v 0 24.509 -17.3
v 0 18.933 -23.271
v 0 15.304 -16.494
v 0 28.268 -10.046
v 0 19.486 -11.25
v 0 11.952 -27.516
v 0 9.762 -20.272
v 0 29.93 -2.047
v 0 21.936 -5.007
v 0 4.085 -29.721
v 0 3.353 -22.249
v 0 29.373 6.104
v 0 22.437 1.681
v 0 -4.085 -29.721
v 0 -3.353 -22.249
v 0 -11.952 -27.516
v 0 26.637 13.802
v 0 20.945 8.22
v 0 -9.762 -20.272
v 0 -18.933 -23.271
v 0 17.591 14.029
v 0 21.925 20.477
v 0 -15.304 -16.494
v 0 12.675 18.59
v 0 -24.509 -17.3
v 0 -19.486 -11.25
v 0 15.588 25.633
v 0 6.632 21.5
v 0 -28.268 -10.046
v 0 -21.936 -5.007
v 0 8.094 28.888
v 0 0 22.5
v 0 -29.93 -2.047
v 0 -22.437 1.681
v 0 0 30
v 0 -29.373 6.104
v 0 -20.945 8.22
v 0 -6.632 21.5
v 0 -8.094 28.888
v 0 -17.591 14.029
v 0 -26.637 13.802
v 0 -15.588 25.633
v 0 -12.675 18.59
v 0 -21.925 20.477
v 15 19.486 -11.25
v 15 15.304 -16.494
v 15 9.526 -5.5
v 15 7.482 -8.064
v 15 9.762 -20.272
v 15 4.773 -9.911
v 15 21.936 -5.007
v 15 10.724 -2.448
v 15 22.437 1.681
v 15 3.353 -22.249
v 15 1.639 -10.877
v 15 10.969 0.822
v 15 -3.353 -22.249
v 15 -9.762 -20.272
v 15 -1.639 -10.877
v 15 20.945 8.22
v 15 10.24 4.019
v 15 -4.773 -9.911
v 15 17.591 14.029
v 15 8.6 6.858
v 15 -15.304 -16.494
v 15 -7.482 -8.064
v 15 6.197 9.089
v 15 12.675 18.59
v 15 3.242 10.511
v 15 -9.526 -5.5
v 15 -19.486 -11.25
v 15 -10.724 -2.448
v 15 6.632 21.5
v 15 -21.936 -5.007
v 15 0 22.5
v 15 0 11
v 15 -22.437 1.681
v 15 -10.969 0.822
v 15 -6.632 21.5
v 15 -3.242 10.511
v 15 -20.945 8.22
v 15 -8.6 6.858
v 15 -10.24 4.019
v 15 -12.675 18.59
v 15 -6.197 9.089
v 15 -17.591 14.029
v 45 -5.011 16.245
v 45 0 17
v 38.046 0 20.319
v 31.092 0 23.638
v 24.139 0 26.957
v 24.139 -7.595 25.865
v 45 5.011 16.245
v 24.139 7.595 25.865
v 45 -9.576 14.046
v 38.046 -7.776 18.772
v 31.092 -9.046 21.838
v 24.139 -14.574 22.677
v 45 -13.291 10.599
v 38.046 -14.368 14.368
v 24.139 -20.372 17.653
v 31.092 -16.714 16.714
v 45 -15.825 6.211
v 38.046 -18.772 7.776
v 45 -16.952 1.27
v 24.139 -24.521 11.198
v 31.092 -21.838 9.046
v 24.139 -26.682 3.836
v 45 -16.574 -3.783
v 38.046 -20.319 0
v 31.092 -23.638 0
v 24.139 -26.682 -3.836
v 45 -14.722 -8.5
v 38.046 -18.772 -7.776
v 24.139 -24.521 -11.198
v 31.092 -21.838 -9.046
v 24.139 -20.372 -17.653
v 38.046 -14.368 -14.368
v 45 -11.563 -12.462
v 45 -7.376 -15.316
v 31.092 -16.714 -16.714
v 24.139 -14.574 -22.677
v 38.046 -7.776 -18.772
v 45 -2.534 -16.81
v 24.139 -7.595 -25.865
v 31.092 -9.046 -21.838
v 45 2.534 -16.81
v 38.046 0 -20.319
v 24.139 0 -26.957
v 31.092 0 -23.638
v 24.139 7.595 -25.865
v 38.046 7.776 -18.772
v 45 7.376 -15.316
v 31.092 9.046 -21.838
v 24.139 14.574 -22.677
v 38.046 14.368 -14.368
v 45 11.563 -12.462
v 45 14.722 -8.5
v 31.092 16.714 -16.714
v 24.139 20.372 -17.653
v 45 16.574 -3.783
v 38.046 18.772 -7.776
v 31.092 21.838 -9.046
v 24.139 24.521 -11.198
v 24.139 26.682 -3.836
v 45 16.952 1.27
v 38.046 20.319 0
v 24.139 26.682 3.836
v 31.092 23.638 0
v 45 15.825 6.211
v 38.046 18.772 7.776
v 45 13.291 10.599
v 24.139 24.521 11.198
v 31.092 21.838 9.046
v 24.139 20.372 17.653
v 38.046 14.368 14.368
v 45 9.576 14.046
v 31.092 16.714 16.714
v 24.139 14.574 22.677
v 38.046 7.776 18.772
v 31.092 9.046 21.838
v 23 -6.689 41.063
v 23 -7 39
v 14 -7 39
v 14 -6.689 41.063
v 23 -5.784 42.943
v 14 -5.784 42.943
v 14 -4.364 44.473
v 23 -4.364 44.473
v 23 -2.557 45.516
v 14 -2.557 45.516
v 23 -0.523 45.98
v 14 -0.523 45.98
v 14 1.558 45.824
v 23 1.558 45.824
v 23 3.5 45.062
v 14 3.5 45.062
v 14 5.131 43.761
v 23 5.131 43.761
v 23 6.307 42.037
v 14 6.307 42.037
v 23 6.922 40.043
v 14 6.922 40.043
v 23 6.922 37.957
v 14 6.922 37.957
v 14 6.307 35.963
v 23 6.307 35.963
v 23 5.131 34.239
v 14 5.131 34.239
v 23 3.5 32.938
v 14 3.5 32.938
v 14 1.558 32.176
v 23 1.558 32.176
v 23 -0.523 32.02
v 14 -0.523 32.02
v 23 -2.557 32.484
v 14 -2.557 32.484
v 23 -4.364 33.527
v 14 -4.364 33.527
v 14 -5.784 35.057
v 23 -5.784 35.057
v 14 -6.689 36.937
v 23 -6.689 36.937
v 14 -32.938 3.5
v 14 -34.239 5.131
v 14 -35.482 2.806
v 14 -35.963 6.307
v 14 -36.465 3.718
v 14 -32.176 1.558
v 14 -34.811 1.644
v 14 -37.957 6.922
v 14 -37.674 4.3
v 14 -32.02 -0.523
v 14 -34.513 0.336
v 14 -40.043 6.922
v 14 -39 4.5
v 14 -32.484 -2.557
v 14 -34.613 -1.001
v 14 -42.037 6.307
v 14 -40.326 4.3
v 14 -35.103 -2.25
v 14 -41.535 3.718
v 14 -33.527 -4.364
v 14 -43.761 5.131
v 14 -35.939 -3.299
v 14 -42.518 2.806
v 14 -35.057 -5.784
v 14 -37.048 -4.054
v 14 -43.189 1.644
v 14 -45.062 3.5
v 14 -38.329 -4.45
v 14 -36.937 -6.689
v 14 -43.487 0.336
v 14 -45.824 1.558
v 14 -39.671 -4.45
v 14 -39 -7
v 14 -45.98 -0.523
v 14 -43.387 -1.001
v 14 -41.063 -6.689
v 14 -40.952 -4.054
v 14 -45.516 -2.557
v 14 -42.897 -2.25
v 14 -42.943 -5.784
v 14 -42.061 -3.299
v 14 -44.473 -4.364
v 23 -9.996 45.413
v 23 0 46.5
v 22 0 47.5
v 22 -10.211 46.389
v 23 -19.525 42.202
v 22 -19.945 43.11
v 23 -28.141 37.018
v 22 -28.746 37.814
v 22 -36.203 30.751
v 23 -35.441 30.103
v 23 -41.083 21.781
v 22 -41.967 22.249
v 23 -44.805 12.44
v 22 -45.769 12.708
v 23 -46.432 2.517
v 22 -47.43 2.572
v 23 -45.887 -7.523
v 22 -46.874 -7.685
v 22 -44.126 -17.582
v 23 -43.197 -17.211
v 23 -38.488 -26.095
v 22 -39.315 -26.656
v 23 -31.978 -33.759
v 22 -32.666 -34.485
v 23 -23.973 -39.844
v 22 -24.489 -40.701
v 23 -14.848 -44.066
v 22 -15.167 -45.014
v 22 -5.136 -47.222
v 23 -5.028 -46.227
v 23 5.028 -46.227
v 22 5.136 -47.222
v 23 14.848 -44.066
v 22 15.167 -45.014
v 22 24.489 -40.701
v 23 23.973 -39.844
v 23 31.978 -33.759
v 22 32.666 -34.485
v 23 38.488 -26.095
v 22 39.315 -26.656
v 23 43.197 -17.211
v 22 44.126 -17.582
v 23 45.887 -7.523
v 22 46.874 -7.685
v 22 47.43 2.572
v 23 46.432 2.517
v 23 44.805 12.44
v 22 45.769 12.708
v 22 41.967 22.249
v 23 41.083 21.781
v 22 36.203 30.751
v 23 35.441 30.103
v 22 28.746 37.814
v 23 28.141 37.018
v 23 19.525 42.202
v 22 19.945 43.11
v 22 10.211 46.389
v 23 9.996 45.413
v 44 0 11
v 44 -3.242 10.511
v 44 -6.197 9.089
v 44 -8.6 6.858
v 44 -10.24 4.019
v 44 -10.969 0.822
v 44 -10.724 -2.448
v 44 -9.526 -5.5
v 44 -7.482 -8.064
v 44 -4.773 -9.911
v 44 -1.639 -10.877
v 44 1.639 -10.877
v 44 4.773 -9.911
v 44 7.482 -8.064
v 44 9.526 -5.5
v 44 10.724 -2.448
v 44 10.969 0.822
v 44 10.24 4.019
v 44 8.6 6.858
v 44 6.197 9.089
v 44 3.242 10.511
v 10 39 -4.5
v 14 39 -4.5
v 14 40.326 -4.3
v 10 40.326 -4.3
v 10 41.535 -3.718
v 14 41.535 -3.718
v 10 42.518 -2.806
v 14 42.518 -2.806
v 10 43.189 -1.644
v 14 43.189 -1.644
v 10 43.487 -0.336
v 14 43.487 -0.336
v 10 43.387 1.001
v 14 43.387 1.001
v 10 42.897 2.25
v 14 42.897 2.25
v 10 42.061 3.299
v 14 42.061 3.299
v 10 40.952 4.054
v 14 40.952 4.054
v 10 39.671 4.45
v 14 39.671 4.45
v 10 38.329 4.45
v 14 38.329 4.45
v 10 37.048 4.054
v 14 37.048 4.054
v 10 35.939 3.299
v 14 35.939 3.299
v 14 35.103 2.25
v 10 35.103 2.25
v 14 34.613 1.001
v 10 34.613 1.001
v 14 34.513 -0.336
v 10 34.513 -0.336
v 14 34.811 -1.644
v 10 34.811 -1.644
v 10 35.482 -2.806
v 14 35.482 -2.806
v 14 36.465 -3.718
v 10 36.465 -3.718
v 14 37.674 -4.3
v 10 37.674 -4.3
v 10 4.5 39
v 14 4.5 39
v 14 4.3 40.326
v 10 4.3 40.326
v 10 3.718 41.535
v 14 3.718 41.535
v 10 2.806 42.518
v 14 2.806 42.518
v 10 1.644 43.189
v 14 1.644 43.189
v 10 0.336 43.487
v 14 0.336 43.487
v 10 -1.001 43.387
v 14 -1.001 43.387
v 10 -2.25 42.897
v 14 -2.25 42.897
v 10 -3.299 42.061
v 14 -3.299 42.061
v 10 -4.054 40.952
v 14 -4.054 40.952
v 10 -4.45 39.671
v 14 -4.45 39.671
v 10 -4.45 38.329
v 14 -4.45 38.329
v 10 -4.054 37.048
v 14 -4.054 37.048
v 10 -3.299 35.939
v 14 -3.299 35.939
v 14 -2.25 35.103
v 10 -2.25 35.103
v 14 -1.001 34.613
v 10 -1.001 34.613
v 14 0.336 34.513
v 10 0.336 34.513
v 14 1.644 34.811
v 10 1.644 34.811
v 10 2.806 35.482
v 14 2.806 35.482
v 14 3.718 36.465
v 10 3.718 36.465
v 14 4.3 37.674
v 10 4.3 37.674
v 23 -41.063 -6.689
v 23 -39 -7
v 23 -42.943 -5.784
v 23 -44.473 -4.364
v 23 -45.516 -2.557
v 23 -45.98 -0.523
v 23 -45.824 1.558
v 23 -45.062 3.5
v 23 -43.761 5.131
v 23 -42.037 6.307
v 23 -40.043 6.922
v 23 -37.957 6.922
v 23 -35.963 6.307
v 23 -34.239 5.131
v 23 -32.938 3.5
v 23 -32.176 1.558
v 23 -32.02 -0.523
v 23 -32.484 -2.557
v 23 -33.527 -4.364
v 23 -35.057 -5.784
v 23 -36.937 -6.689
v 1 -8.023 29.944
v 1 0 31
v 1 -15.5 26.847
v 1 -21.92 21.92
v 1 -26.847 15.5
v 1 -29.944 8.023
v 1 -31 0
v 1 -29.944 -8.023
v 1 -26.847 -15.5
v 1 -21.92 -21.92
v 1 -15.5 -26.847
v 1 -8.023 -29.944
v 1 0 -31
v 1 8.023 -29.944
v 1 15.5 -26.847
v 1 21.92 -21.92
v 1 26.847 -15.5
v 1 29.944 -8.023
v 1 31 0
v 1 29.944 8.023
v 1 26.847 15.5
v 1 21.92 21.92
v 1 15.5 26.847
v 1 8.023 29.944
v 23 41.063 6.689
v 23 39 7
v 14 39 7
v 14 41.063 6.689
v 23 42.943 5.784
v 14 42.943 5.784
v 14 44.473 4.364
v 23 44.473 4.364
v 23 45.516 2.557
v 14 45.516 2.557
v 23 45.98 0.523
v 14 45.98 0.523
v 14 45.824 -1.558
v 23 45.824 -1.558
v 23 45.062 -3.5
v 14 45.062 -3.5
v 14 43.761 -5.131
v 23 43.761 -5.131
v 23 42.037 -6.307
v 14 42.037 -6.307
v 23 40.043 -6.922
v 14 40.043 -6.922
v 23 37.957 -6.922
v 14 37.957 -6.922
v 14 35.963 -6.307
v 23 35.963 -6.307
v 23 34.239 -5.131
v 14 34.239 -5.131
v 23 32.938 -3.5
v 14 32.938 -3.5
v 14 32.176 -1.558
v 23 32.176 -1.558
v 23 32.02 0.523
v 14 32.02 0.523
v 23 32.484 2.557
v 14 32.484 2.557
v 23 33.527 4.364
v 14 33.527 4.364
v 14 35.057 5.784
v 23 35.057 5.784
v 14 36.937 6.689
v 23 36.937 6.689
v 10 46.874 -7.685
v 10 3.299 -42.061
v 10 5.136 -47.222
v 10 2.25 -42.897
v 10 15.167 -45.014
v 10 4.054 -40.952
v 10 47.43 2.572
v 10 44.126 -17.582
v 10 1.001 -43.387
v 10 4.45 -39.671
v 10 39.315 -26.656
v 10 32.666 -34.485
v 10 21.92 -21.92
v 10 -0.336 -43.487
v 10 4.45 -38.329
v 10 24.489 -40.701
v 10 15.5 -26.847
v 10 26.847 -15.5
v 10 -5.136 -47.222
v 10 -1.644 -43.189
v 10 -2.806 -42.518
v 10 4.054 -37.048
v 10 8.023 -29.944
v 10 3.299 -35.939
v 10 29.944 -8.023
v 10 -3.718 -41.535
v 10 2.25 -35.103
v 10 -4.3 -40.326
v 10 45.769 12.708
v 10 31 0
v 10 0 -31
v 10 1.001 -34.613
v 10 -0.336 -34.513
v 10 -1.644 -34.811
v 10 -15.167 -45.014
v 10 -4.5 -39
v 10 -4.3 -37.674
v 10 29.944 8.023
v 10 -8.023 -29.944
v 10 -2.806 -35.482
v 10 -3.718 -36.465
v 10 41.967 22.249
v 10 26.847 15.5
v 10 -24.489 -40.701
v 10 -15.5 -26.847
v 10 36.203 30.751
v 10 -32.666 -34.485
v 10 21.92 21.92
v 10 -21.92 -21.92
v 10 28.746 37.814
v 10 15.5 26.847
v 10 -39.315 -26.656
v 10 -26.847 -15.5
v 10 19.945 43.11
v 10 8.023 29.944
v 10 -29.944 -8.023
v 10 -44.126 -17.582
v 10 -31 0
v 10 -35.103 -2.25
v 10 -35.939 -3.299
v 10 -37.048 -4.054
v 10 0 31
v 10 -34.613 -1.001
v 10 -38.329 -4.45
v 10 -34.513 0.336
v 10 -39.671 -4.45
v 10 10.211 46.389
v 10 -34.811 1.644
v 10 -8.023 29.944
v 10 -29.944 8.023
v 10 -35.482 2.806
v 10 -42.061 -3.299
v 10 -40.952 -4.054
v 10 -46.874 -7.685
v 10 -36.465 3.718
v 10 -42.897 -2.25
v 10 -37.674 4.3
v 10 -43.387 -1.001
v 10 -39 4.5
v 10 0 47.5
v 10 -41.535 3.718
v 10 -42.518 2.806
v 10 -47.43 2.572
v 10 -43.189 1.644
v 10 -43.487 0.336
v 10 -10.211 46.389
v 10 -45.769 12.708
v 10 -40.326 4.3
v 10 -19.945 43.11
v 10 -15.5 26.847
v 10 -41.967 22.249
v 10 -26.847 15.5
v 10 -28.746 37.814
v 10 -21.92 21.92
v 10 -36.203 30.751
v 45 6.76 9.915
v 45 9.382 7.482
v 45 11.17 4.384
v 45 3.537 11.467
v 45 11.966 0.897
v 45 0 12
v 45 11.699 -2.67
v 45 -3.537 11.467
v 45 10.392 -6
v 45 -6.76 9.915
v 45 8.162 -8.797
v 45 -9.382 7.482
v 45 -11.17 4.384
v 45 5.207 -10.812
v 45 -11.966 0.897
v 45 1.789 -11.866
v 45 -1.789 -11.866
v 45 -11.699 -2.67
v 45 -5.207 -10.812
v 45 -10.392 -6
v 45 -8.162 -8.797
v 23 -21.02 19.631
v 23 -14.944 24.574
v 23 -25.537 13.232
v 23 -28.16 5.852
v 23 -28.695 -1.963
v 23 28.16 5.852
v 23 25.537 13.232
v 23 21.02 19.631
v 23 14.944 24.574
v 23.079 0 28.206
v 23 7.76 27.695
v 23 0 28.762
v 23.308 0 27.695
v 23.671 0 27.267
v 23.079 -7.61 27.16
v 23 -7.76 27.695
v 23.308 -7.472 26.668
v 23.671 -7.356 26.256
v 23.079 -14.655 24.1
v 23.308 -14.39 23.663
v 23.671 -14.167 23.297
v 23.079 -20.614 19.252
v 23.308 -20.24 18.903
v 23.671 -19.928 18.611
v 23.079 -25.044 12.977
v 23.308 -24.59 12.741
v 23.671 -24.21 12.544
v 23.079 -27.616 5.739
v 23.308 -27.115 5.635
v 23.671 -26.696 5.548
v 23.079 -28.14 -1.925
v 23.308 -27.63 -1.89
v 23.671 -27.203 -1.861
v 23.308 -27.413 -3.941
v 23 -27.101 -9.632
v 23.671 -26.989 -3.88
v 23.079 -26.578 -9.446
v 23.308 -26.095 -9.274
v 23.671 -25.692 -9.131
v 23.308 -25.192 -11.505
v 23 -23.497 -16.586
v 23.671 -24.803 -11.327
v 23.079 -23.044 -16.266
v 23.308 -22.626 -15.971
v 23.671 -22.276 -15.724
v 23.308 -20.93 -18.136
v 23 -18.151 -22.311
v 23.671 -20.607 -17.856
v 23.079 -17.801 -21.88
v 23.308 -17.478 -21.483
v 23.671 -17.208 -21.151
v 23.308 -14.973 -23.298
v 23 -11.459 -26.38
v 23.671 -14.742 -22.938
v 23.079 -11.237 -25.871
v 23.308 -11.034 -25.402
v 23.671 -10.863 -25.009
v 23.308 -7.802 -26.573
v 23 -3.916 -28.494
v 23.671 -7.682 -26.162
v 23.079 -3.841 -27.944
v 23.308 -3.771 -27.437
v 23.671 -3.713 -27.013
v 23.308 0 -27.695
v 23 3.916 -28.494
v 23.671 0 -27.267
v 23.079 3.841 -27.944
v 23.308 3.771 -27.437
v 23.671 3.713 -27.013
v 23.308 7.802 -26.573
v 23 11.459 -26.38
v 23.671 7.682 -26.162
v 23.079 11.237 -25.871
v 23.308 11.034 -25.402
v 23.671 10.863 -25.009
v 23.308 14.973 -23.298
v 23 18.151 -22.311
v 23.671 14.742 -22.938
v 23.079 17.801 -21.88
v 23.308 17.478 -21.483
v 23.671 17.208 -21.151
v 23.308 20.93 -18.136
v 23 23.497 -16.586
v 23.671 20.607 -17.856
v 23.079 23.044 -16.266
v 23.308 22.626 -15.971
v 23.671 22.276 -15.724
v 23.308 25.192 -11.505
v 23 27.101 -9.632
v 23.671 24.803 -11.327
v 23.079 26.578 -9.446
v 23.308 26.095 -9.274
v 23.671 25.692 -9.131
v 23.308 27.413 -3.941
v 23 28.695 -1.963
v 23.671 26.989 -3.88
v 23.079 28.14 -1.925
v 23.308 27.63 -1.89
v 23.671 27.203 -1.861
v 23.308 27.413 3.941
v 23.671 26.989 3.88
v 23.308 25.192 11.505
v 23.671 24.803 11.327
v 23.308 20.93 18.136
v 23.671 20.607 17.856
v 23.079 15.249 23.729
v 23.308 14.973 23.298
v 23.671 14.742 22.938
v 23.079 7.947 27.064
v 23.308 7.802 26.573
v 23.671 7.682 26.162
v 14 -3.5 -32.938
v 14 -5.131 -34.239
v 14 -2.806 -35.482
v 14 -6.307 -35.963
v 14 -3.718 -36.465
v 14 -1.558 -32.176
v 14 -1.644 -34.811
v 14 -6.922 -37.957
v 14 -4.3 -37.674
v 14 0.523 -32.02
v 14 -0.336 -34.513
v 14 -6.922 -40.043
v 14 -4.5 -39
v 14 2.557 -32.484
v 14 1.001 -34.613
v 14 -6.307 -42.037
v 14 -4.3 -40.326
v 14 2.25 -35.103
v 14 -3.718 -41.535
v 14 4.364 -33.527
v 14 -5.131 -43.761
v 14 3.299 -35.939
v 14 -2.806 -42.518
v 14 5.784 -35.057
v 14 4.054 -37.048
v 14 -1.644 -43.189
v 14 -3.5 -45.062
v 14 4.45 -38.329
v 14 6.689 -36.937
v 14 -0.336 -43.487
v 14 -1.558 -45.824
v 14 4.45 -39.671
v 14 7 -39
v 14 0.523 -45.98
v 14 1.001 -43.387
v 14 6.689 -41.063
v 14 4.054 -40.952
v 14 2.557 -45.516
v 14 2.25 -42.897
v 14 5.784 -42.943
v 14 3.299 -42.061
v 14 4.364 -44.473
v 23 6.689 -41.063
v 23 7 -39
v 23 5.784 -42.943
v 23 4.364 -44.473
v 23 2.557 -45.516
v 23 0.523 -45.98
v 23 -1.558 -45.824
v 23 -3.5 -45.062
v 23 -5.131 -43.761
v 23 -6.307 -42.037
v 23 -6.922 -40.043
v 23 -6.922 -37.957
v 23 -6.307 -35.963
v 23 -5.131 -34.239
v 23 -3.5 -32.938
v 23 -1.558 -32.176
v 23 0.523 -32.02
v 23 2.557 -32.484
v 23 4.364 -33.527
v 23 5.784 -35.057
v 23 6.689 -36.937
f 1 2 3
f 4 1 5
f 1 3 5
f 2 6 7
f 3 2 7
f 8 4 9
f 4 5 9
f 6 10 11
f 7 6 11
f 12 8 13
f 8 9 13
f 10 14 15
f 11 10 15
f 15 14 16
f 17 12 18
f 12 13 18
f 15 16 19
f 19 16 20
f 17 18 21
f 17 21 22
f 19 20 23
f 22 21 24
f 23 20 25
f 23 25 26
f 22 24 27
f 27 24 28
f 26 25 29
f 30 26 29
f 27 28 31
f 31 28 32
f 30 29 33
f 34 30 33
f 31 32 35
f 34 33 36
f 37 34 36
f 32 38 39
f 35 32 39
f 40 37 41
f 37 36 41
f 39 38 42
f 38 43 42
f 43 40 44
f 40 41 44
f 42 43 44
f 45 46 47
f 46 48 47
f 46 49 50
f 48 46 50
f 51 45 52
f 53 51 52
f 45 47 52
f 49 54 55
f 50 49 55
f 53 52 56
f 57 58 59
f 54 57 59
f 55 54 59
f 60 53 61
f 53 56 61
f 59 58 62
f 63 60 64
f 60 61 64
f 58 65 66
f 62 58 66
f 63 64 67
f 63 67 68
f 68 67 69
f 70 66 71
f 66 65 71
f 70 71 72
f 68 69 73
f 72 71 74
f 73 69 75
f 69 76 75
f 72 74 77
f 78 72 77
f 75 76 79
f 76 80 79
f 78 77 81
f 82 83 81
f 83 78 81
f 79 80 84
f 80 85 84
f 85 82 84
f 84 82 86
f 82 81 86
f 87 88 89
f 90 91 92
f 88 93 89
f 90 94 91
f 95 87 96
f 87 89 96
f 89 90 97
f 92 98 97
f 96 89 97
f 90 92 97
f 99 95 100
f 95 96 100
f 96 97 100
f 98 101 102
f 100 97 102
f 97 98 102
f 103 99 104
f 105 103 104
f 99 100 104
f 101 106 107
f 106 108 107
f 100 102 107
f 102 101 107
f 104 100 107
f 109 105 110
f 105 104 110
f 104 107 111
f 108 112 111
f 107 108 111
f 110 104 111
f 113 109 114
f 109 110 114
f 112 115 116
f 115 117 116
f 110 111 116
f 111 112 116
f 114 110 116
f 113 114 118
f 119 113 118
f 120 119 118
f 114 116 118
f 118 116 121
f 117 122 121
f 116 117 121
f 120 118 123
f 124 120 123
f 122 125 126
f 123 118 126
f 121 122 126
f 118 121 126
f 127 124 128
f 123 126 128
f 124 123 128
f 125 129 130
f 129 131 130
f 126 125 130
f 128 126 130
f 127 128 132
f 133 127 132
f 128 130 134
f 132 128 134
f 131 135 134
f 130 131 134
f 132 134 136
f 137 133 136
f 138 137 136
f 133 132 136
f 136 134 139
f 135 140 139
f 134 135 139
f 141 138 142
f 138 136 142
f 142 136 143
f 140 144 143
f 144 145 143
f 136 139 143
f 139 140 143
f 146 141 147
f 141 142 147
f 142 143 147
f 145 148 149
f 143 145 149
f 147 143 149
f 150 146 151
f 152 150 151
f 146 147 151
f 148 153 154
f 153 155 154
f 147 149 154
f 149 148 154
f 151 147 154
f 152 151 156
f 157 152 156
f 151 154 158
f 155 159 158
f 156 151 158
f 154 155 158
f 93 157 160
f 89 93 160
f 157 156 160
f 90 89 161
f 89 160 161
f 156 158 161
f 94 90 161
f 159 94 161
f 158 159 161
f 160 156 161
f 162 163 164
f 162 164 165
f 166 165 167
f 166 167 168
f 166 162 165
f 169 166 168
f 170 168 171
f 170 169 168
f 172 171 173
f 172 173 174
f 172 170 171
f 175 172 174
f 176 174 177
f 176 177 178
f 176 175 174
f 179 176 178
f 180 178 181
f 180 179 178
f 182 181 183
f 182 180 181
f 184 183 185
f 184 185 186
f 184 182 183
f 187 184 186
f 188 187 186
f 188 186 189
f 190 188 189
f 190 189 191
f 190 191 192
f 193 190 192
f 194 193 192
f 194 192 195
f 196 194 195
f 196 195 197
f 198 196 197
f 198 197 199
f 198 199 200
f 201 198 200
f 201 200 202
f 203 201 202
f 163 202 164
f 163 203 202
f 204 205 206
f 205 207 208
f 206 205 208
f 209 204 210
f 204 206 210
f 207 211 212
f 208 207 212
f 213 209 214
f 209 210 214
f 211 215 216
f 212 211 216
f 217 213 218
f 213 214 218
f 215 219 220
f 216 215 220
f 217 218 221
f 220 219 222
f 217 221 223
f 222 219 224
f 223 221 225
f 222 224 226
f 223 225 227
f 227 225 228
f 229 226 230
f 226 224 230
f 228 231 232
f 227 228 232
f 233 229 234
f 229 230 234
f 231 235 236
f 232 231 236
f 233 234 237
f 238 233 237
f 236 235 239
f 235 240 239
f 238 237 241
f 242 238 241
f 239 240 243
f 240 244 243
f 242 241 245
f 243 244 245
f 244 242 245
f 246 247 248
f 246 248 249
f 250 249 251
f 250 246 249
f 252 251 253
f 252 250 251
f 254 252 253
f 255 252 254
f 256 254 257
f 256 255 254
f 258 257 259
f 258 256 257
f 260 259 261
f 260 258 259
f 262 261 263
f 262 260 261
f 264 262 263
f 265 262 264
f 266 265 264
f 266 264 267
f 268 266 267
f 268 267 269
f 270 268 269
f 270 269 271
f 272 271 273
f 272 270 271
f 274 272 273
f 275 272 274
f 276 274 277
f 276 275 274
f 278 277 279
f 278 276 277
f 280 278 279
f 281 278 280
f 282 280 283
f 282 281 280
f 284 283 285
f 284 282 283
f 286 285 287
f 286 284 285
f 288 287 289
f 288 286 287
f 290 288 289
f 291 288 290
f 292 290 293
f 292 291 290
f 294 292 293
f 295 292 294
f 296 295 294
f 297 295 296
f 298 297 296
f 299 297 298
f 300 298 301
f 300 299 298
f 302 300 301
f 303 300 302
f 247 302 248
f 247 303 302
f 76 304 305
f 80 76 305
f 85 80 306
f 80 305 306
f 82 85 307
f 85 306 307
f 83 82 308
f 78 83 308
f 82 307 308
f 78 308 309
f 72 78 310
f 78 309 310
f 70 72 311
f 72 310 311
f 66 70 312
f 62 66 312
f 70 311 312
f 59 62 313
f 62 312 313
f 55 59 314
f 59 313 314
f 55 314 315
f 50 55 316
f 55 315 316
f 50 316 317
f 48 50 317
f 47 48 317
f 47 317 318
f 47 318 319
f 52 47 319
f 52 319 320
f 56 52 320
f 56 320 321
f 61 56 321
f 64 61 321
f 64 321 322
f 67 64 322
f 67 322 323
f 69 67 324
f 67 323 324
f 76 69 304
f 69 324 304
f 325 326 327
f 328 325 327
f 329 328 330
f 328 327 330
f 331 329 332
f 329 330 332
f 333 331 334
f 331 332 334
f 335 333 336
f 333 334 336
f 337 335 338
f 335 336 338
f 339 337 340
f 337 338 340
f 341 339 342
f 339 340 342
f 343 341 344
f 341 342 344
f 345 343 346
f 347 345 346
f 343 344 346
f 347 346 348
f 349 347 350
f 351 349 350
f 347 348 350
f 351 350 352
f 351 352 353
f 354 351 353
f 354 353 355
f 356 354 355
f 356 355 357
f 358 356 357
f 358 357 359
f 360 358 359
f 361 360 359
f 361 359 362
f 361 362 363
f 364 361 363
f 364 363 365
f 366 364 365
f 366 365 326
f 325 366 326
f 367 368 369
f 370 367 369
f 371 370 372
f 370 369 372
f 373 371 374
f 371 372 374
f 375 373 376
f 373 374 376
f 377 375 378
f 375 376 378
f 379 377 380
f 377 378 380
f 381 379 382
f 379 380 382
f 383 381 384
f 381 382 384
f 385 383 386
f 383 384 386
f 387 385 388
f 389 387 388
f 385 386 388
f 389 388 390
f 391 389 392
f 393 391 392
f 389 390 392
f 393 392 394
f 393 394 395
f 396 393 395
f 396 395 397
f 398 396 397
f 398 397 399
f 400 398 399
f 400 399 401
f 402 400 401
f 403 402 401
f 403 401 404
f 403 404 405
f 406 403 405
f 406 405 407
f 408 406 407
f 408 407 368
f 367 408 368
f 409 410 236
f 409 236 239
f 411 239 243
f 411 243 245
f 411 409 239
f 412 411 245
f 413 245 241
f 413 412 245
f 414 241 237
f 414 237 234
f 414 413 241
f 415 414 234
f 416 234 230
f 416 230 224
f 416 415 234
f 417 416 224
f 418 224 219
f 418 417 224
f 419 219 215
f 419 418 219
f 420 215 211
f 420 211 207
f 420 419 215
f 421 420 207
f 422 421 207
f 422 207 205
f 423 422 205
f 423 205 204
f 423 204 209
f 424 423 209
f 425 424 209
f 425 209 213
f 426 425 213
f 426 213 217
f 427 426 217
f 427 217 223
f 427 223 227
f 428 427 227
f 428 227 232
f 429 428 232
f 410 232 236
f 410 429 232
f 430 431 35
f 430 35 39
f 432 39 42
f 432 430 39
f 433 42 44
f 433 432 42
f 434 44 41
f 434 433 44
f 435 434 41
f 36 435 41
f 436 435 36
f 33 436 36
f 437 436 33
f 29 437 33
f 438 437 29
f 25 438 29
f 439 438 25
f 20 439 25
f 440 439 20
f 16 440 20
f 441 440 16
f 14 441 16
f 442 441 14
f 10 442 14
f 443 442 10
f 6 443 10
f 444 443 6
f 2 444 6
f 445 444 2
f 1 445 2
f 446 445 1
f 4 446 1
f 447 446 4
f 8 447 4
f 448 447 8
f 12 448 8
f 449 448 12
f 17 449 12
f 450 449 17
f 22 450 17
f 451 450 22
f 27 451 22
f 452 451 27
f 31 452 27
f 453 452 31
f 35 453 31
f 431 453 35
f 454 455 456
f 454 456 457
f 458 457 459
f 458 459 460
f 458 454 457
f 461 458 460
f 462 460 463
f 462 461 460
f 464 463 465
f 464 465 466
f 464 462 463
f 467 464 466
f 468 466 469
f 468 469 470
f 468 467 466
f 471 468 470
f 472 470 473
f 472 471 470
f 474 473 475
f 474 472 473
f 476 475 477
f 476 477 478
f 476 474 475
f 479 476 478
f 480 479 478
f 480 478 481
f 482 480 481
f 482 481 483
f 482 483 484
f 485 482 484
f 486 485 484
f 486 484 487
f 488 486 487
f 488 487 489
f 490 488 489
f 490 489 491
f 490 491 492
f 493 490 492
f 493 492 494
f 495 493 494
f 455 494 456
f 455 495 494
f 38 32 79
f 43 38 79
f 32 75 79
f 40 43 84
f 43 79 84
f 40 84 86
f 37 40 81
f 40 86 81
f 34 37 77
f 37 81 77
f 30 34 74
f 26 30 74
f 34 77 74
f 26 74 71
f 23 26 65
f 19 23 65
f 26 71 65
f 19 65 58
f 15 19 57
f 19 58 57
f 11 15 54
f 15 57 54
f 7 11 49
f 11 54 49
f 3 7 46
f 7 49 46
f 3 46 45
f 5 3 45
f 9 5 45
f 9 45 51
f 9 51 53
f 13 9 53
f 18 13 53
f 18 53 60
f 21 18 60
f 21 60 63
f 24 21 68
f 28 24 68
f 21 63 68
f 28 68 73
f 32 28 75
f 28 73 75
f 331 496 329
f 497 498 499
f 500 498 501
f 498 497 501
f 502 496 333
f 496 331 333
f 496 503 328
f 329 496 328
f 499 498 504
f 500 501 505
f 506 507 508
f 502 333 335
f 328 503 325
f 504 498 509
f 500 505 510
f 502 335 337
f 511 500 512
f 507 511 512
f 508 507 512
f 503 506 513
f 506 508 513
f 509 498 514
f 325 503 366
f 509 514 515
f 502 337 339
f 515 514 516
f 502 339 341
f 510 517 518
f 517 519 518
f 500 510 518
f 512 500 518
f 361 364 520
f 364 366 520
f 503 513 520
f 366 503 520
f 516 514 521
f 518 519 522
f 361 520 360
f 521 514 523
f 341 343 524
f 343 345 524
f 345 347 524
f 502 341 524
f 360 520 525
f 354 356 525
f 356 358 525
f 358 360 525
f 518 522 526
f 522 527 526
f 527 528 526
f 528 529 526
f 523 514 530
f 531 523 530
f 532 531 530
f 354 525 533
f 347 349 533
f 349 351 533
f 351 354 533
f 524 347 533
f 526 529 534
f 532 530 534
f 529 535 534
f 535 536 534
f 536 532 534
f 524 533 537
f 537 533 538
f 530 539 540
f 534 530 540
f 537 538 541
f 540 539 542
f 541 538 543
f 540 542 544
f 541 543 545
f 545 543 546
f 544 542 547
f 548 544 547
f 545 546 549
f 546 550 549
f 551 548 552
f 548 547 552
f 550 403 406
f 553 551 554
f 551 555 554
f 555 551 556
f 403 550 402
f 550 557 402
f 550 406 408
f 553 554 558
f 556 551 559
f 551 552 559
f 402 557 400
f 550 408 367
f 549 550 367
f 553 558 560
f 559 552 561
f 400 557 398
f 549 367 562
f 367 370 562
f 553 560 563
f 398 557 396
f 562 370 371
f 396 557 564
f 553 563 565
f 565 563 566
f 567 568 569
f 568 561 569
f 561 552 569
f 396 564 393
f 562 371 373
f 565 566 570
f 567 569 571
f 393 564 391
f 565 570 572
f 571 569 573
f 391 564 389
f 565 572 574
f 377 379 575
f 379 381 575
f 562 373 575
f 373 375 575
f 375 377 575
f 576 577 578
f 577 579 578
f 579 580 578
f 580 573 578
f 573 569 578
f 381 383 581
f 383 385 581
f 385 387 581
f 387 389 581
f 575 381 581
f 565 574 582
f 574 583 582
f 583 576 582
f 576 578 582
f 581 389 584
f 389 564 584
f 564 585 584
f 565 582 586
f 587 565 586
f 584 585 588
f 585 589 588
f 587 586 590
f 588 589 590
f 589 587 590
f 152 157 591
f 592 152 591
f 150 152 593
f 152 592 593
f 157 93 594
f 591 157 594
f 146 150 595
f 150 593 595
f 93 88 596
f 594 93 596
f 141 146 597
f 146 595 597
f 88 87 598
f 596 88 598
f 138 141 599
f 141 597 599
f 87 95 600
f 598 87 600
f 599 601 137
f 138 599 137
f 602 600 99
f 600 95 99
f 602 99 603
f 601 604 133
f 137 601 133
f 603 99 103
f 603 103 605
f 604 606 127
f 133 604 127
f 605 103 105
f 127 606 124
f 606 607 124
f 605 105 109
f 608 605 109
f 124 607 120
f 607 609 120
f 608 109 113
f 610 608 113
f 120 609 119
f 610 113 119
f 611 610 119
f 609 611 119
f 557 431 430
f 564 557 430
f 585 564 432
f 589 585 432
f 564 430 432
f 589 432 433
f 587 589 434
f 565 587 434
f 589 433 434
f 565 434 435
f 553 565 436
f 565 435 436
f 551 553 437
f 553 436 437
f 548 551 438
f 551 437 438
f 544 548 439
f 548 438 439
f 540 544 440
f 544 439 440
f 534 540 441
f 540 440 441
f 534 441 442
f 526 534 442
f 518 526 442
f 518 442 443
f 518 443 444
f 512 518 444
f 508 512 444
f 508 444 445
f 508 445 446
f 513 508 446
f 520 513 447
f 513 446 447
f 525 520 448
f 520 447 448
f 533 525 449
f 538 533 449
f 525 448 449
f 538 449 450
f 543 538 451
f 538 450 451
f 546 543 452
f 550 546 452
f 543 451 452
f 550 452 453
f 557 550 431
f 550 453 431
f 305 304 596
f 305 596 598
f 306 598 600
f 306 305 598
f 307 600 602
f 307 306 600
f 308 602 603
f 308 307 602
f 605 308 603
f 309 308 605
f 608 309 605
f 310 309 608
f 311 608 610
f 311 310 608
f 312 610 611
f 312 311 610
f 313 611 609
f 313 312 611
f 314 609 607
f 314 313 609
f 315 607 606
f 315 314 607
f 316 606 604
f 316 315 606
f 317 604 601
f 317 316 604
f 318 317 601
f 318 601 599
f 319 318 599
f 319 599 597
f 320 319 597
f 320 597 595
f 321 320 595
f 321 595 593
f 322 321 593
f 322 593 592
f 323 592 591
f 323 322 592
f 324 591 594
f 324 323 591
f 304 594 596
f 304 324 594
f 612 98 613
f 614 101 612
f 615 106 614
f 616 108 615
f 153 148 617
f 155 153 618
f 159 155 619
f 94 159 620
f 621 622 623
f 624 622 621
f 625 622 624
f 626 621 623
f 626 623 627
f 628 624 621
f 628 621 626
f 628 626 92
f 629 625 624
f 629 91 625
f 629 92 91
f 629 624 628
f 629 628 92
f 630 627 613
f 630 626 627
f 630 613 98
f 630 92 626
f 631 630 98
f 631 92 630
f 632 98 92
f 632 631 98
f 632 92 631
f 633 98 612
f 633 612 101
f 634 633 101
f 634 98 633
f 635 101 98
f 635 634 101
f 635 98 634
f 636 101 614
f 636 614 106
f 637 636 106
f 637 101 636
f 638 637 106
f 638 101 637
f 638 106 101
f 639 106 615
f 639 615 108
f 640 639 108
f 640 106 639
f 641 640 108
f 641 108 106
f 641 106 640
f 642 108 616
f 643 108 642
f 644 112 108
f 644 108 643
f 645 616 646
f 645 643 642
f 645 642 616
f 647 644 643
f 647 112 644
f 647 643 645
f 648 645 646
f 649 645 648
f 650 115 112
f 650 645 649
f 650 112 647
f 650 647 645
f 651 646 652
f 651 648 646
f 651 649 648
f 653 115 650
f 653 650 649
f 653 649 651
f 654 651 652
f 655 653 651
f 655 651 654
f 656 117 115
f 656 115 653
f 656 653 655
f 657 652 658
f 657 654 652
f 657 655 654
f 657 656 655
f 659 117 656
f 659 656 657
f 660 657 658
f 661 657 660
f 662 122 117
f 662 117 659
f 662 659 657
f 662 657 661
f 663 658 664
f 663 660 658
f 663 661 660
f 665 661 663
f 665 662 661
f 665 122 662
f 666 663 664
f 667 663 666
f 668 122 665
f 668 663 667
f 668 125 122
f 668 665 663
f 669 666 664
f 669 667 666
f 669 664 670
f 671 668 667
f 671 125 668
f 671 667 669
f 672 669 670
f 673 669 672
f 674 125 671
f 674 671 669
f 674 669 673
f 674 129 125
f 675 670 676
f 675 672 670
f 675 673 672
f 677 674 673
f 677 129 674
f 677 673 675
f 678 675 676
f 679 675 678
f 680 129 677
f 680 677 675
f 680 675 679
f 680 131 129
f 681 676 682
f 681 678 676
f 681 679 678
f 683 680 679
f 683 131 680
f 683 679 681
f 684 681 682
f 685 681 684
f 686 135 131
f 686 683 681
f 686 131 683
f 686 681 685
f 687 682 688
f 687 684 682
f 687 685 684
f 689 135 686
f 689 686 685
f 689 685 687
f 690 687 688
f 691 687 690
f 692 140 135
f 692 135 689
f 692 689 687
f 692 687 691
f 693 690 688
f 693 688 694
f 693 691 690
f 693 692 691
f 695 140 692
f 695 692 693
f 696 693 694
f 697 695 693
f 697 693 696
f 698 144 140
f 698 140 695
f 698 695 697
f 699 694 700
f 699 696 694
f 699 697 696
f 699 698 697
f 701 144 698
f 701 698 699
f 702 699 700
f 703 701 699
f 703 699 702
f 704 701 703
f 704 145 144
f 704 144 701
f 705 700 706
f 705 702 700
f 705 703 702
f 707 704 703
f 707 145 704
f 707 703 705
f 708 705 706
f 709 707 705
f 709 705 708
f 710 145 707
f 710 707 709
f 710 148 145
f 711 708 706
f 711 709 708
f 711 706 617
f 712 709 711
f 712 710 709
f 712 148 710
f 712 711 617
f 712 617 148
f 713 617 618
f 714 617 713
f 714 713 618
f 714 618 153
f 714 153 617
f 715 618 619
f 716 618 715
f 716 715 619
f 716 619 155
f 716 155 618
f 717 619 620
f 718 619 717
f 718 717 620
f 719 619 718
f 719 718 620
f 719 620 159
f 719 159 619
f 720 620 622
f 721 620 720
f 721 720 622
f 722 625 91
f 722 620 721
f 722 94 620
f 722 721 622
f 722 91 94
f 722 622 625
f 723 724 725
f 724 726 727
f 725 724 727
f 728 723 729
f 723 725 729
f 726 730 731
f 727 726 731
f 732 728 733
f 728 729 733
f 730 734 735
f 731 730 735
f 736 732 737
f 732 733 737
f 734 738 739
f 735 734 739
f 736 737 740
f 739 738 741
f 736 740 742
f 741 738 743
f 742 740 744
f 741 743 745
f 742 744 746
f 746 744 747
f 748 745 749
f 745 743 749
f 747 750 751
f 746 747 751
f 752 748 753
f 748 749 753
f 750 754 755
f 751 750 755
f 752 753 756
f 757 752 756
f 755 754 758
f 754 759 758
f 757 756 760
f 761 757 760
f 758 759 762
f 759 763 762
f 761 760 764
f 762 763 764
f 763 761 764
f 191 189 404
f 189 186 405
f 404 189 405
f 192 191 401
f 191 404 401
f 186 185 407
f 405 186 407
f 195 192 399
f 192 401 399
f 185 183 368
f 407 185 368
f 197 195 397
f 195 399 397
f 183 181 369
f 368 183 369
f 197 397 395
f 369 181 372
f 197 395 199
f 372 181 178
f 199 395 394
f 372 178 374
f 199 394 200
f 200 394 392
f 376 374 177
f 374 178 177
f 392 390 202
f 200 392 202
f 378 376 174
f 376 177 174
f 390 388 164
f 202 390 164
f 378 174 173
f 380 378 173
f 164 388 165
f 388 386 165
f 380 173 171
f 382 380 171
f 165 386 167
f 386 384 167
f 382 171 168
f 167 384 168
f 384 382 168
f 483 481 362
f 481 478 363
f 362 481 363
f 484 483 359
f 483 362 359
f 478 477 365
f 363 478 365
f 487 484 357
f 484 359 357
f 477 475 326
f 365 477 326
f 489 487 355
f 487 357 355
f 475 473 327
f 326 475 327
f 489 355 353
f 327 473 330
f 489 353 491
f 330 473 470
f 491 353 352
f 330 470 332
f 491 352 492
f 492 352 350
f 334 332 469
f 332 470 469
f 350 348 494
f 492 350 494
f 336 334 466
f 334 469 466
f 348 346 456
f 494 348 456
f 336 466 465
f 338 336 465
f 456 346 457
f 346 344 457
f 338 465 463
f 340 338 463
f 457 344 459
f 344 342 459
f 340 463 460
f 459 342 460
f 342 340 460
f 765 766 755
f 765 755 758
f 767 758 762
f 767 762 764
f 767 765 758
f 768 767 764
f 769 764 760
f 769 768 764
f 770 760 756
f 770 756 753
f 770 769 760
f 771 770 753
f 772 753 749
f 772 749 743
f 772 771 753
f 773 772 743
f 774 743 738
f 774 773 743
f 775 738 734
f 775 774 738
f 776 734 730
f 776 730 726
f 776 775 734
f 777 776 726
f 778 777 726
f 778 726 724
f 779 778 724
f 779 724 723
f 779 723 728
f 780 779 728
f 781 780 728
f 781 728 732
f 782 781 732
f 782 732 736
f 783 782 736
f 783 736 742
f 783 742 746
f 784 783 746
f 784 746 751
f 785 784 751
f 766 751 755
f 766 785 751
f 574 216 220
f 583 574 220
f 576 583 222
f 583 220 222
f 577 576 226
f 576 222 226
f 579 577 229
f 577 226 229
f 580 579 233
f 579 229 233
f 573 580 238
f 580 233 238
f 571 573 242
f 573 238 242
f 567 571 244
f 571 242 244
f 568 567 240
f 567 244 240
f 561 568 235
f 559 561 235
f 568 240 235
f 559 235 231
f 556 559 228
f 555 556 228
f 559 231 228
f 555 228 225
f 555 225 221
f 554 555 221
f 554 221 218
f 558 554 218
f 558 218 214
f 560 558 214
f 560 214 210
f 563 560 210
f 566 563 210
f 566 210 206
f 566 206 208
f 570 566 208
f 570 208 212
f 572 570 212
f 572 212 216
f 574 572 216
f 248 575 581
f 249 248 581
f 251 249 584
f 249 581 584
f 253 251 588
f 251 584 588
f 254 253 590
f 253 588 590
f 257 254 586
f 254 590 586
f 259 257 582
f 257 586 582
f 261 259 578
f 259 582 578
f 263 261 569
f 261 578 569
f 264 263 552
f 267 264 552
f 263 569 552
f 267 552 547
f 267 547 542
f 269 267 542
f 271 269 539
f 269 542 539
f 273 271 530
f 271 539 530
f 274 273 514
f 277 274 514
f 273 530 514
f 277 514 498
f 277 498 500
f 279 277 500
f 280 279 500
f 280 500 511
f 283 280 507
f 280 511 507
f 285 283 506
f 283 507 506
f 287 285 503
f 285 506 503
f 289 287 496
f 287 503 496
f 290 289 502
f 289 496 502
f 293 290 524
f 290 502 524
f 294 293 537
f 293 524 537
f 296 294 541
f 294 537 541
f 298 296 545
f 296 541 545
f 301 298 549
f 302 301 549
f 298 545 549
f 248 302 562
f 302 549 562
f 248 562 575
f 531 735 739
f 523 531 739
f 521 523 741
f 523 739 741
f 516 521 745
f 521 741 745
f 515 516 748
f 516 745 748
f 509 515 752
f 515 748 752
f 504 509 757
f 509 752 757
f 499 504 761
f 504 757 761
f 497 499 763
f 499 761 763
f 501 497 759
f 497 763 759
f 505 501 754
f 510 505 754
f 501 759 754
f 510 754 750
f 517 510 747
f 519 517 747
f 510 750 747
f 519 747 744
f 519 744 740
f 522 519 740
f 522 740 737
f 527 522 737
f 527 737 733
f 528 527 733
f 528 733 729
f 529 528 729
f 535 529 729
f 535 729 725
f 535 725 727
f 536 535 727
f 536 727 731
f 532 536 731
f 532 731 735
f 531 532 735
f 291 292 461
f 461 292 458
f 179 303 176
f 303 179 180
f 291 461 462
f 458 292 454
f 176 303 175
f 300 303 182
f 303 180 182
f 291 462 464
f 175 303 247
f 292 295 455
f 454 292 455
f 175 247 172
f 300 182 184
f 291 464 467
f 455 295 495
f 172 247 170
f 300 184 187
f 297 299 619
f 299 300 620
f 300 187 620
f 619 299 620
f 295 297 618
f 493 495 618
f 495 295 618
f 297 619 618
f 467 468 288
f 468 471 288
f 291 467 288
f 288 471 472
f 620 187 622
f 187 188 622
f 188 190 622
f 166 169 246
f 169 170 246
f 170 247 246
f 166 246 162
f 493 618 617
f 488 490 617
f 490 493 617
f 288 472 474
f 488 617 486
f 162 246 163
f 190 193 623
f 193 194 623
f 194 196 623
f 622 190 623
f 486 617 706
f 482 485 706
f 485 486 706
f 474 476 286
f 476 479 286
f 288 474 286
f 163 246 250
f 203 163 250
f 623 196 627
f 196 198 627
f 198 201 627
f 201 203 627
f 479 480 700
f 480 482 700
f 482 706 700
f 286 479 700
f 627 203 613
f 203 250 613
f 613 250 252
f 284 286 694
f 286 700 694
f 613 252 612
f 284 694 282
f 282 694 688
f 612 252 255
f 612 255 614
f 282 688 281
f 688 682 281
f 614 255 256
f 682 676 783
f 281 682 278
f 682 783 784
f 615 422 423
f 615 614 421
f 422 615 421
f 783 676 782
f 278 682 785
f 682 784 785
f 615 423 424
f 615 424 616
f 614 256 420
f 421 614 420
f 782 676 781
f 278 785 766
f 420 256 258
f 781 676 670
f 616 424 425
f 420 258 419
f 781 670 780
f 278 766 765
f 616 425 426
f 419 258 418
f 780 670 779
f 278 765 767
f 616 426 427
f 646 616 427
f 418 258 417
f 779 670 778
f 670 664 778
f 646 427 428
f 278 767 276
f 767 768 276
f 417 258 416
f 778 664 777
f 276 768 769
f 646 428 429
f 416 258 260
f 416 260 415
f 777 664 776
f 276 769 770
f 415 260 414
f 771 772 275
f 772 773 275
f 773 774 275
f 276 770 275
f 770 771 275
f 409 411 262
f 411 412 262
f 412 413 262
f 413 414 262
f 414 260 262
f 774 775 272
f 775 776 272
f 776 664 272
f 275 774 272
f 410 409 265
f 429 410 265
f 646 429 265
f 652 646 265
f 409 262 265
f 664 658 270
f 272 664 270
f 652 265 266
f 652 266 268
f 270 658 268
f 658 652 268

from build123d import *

# Parameters (mm, degrees)
CHAMFER_1_SIZE           = 1
CHAMFER_2_SIZE           = 1
CHAMFER_3_SIZE           = 1
FILLET_1_R               = 2
SKETCH_2_R               = 4.5
CUT_EXTRUDE_1_DEPTH      = 72.003521039
CUT_EXTRUDE_START        = -13
SKETCH_3_R               = 7
CUT_EXTRUDE_2_DEPTH      = 9
PATTERN_CIRCULAR_2_COUNT = 4


with BuildPart() as part:
    # 草图1 → 旋转1 (revolve)
    with BuildSketch(Plane.XY, mode=Mode.PRIVATE) as revolve_1_sk:
        Polygon((45, 11), (45, 17), (23, 27.5), (23, 47.5), (10, 47.5), (10, 31), (0, 31), (0, 22.5), (15, 22.5), (15, 11), align=None)
    revolve(revolve_1_sk.sketch.rotate(Axis((0, 0, 0), (1, 0, 0)), 90), axis=Axis((0, 0, 0), (1, 0, 0)))

    # 倒角1
    chamfer_1_edges = [part.edges().sort_by_distance(p)[0] for p in [
        (45, 0, -11),
    ]]
    chamfer(chamfer_1_edges, length=CHAMFER_1_SIZE)

    # 倒角2
    chamfer_2_edges = [part.edges().sort_by_distance(p)[0] for p in [
        (0, 0, -31),
    ]]
    chamfer(chamfer_2_edges, length=CHAMFER_2_SIZE)

    # 倒角3
    chamfer_3_edges = [part.edges().sort_by_distance(p)[0] for p in [
        (23, 0, -47.5),
    ]]
    chamfer(chamfer_3_edges, length=CHAMFER_3_SIZE)

    # 圆角1
    fillet_1_edges = [part.edges().sort_by_distance(p)[0] for p in [
        (23, 0, -27.5),
    ]]
    fillet(fillet_1_edges, radius=FILLET_1_R)

    # 草图2 → 切除-拉伸1 (cut, through all)
    with BuildSketch(Plane(origin=(23, 0, 0), x_dir=(0, 0, -1), z_dir=(1, 0, 0))):
        with Locations((0, 39)):
            Circle(SKETCH_2_R)
    cut_extrude_1 = extrude(amount=-CUT_EXTRUDE_1_DEPTH, mode=Mode.SUBTRACT)

    # 草图3 → 切除-拉伸2 (cut)
    with BuildSketch(Plane.ZY.offset(-10).offset(CUT_EXTRUDE_START)):
        with Locations((0, 39)):
            Circle(SKETCH_3_R)
    cut_extrude_2 = extrude(amount=CUT_EXTRUDE_2_DEPTH, mode=Mode.SUBTRACT)

    # 阵列(圆周)2: 切除-拉伸1, 切除-拉伸2 ×4 about axis
    pattern_circular_2_axis = Axis((0, 0, 0), (1, 0, 0))
    add([cut_extrude_1.rotate(pattern_circular_2_axis, i * 360 / PATTERN_CIRCULAR_2_COUNT) for i in range(1, PATTERN_CIRCULAR_2_COUNT)], mode=Mode.SUBTRACT)
    add([cut_extrude_2.rotate(pattern_circular_2_axis, i * 360 / PATTERN_CIRCULAR_2_COUNT) for i in range(1, PATTERN_CIRCULAR_2_COUNT)], mode=Mode.SUBTRACT)


solid = part.part
